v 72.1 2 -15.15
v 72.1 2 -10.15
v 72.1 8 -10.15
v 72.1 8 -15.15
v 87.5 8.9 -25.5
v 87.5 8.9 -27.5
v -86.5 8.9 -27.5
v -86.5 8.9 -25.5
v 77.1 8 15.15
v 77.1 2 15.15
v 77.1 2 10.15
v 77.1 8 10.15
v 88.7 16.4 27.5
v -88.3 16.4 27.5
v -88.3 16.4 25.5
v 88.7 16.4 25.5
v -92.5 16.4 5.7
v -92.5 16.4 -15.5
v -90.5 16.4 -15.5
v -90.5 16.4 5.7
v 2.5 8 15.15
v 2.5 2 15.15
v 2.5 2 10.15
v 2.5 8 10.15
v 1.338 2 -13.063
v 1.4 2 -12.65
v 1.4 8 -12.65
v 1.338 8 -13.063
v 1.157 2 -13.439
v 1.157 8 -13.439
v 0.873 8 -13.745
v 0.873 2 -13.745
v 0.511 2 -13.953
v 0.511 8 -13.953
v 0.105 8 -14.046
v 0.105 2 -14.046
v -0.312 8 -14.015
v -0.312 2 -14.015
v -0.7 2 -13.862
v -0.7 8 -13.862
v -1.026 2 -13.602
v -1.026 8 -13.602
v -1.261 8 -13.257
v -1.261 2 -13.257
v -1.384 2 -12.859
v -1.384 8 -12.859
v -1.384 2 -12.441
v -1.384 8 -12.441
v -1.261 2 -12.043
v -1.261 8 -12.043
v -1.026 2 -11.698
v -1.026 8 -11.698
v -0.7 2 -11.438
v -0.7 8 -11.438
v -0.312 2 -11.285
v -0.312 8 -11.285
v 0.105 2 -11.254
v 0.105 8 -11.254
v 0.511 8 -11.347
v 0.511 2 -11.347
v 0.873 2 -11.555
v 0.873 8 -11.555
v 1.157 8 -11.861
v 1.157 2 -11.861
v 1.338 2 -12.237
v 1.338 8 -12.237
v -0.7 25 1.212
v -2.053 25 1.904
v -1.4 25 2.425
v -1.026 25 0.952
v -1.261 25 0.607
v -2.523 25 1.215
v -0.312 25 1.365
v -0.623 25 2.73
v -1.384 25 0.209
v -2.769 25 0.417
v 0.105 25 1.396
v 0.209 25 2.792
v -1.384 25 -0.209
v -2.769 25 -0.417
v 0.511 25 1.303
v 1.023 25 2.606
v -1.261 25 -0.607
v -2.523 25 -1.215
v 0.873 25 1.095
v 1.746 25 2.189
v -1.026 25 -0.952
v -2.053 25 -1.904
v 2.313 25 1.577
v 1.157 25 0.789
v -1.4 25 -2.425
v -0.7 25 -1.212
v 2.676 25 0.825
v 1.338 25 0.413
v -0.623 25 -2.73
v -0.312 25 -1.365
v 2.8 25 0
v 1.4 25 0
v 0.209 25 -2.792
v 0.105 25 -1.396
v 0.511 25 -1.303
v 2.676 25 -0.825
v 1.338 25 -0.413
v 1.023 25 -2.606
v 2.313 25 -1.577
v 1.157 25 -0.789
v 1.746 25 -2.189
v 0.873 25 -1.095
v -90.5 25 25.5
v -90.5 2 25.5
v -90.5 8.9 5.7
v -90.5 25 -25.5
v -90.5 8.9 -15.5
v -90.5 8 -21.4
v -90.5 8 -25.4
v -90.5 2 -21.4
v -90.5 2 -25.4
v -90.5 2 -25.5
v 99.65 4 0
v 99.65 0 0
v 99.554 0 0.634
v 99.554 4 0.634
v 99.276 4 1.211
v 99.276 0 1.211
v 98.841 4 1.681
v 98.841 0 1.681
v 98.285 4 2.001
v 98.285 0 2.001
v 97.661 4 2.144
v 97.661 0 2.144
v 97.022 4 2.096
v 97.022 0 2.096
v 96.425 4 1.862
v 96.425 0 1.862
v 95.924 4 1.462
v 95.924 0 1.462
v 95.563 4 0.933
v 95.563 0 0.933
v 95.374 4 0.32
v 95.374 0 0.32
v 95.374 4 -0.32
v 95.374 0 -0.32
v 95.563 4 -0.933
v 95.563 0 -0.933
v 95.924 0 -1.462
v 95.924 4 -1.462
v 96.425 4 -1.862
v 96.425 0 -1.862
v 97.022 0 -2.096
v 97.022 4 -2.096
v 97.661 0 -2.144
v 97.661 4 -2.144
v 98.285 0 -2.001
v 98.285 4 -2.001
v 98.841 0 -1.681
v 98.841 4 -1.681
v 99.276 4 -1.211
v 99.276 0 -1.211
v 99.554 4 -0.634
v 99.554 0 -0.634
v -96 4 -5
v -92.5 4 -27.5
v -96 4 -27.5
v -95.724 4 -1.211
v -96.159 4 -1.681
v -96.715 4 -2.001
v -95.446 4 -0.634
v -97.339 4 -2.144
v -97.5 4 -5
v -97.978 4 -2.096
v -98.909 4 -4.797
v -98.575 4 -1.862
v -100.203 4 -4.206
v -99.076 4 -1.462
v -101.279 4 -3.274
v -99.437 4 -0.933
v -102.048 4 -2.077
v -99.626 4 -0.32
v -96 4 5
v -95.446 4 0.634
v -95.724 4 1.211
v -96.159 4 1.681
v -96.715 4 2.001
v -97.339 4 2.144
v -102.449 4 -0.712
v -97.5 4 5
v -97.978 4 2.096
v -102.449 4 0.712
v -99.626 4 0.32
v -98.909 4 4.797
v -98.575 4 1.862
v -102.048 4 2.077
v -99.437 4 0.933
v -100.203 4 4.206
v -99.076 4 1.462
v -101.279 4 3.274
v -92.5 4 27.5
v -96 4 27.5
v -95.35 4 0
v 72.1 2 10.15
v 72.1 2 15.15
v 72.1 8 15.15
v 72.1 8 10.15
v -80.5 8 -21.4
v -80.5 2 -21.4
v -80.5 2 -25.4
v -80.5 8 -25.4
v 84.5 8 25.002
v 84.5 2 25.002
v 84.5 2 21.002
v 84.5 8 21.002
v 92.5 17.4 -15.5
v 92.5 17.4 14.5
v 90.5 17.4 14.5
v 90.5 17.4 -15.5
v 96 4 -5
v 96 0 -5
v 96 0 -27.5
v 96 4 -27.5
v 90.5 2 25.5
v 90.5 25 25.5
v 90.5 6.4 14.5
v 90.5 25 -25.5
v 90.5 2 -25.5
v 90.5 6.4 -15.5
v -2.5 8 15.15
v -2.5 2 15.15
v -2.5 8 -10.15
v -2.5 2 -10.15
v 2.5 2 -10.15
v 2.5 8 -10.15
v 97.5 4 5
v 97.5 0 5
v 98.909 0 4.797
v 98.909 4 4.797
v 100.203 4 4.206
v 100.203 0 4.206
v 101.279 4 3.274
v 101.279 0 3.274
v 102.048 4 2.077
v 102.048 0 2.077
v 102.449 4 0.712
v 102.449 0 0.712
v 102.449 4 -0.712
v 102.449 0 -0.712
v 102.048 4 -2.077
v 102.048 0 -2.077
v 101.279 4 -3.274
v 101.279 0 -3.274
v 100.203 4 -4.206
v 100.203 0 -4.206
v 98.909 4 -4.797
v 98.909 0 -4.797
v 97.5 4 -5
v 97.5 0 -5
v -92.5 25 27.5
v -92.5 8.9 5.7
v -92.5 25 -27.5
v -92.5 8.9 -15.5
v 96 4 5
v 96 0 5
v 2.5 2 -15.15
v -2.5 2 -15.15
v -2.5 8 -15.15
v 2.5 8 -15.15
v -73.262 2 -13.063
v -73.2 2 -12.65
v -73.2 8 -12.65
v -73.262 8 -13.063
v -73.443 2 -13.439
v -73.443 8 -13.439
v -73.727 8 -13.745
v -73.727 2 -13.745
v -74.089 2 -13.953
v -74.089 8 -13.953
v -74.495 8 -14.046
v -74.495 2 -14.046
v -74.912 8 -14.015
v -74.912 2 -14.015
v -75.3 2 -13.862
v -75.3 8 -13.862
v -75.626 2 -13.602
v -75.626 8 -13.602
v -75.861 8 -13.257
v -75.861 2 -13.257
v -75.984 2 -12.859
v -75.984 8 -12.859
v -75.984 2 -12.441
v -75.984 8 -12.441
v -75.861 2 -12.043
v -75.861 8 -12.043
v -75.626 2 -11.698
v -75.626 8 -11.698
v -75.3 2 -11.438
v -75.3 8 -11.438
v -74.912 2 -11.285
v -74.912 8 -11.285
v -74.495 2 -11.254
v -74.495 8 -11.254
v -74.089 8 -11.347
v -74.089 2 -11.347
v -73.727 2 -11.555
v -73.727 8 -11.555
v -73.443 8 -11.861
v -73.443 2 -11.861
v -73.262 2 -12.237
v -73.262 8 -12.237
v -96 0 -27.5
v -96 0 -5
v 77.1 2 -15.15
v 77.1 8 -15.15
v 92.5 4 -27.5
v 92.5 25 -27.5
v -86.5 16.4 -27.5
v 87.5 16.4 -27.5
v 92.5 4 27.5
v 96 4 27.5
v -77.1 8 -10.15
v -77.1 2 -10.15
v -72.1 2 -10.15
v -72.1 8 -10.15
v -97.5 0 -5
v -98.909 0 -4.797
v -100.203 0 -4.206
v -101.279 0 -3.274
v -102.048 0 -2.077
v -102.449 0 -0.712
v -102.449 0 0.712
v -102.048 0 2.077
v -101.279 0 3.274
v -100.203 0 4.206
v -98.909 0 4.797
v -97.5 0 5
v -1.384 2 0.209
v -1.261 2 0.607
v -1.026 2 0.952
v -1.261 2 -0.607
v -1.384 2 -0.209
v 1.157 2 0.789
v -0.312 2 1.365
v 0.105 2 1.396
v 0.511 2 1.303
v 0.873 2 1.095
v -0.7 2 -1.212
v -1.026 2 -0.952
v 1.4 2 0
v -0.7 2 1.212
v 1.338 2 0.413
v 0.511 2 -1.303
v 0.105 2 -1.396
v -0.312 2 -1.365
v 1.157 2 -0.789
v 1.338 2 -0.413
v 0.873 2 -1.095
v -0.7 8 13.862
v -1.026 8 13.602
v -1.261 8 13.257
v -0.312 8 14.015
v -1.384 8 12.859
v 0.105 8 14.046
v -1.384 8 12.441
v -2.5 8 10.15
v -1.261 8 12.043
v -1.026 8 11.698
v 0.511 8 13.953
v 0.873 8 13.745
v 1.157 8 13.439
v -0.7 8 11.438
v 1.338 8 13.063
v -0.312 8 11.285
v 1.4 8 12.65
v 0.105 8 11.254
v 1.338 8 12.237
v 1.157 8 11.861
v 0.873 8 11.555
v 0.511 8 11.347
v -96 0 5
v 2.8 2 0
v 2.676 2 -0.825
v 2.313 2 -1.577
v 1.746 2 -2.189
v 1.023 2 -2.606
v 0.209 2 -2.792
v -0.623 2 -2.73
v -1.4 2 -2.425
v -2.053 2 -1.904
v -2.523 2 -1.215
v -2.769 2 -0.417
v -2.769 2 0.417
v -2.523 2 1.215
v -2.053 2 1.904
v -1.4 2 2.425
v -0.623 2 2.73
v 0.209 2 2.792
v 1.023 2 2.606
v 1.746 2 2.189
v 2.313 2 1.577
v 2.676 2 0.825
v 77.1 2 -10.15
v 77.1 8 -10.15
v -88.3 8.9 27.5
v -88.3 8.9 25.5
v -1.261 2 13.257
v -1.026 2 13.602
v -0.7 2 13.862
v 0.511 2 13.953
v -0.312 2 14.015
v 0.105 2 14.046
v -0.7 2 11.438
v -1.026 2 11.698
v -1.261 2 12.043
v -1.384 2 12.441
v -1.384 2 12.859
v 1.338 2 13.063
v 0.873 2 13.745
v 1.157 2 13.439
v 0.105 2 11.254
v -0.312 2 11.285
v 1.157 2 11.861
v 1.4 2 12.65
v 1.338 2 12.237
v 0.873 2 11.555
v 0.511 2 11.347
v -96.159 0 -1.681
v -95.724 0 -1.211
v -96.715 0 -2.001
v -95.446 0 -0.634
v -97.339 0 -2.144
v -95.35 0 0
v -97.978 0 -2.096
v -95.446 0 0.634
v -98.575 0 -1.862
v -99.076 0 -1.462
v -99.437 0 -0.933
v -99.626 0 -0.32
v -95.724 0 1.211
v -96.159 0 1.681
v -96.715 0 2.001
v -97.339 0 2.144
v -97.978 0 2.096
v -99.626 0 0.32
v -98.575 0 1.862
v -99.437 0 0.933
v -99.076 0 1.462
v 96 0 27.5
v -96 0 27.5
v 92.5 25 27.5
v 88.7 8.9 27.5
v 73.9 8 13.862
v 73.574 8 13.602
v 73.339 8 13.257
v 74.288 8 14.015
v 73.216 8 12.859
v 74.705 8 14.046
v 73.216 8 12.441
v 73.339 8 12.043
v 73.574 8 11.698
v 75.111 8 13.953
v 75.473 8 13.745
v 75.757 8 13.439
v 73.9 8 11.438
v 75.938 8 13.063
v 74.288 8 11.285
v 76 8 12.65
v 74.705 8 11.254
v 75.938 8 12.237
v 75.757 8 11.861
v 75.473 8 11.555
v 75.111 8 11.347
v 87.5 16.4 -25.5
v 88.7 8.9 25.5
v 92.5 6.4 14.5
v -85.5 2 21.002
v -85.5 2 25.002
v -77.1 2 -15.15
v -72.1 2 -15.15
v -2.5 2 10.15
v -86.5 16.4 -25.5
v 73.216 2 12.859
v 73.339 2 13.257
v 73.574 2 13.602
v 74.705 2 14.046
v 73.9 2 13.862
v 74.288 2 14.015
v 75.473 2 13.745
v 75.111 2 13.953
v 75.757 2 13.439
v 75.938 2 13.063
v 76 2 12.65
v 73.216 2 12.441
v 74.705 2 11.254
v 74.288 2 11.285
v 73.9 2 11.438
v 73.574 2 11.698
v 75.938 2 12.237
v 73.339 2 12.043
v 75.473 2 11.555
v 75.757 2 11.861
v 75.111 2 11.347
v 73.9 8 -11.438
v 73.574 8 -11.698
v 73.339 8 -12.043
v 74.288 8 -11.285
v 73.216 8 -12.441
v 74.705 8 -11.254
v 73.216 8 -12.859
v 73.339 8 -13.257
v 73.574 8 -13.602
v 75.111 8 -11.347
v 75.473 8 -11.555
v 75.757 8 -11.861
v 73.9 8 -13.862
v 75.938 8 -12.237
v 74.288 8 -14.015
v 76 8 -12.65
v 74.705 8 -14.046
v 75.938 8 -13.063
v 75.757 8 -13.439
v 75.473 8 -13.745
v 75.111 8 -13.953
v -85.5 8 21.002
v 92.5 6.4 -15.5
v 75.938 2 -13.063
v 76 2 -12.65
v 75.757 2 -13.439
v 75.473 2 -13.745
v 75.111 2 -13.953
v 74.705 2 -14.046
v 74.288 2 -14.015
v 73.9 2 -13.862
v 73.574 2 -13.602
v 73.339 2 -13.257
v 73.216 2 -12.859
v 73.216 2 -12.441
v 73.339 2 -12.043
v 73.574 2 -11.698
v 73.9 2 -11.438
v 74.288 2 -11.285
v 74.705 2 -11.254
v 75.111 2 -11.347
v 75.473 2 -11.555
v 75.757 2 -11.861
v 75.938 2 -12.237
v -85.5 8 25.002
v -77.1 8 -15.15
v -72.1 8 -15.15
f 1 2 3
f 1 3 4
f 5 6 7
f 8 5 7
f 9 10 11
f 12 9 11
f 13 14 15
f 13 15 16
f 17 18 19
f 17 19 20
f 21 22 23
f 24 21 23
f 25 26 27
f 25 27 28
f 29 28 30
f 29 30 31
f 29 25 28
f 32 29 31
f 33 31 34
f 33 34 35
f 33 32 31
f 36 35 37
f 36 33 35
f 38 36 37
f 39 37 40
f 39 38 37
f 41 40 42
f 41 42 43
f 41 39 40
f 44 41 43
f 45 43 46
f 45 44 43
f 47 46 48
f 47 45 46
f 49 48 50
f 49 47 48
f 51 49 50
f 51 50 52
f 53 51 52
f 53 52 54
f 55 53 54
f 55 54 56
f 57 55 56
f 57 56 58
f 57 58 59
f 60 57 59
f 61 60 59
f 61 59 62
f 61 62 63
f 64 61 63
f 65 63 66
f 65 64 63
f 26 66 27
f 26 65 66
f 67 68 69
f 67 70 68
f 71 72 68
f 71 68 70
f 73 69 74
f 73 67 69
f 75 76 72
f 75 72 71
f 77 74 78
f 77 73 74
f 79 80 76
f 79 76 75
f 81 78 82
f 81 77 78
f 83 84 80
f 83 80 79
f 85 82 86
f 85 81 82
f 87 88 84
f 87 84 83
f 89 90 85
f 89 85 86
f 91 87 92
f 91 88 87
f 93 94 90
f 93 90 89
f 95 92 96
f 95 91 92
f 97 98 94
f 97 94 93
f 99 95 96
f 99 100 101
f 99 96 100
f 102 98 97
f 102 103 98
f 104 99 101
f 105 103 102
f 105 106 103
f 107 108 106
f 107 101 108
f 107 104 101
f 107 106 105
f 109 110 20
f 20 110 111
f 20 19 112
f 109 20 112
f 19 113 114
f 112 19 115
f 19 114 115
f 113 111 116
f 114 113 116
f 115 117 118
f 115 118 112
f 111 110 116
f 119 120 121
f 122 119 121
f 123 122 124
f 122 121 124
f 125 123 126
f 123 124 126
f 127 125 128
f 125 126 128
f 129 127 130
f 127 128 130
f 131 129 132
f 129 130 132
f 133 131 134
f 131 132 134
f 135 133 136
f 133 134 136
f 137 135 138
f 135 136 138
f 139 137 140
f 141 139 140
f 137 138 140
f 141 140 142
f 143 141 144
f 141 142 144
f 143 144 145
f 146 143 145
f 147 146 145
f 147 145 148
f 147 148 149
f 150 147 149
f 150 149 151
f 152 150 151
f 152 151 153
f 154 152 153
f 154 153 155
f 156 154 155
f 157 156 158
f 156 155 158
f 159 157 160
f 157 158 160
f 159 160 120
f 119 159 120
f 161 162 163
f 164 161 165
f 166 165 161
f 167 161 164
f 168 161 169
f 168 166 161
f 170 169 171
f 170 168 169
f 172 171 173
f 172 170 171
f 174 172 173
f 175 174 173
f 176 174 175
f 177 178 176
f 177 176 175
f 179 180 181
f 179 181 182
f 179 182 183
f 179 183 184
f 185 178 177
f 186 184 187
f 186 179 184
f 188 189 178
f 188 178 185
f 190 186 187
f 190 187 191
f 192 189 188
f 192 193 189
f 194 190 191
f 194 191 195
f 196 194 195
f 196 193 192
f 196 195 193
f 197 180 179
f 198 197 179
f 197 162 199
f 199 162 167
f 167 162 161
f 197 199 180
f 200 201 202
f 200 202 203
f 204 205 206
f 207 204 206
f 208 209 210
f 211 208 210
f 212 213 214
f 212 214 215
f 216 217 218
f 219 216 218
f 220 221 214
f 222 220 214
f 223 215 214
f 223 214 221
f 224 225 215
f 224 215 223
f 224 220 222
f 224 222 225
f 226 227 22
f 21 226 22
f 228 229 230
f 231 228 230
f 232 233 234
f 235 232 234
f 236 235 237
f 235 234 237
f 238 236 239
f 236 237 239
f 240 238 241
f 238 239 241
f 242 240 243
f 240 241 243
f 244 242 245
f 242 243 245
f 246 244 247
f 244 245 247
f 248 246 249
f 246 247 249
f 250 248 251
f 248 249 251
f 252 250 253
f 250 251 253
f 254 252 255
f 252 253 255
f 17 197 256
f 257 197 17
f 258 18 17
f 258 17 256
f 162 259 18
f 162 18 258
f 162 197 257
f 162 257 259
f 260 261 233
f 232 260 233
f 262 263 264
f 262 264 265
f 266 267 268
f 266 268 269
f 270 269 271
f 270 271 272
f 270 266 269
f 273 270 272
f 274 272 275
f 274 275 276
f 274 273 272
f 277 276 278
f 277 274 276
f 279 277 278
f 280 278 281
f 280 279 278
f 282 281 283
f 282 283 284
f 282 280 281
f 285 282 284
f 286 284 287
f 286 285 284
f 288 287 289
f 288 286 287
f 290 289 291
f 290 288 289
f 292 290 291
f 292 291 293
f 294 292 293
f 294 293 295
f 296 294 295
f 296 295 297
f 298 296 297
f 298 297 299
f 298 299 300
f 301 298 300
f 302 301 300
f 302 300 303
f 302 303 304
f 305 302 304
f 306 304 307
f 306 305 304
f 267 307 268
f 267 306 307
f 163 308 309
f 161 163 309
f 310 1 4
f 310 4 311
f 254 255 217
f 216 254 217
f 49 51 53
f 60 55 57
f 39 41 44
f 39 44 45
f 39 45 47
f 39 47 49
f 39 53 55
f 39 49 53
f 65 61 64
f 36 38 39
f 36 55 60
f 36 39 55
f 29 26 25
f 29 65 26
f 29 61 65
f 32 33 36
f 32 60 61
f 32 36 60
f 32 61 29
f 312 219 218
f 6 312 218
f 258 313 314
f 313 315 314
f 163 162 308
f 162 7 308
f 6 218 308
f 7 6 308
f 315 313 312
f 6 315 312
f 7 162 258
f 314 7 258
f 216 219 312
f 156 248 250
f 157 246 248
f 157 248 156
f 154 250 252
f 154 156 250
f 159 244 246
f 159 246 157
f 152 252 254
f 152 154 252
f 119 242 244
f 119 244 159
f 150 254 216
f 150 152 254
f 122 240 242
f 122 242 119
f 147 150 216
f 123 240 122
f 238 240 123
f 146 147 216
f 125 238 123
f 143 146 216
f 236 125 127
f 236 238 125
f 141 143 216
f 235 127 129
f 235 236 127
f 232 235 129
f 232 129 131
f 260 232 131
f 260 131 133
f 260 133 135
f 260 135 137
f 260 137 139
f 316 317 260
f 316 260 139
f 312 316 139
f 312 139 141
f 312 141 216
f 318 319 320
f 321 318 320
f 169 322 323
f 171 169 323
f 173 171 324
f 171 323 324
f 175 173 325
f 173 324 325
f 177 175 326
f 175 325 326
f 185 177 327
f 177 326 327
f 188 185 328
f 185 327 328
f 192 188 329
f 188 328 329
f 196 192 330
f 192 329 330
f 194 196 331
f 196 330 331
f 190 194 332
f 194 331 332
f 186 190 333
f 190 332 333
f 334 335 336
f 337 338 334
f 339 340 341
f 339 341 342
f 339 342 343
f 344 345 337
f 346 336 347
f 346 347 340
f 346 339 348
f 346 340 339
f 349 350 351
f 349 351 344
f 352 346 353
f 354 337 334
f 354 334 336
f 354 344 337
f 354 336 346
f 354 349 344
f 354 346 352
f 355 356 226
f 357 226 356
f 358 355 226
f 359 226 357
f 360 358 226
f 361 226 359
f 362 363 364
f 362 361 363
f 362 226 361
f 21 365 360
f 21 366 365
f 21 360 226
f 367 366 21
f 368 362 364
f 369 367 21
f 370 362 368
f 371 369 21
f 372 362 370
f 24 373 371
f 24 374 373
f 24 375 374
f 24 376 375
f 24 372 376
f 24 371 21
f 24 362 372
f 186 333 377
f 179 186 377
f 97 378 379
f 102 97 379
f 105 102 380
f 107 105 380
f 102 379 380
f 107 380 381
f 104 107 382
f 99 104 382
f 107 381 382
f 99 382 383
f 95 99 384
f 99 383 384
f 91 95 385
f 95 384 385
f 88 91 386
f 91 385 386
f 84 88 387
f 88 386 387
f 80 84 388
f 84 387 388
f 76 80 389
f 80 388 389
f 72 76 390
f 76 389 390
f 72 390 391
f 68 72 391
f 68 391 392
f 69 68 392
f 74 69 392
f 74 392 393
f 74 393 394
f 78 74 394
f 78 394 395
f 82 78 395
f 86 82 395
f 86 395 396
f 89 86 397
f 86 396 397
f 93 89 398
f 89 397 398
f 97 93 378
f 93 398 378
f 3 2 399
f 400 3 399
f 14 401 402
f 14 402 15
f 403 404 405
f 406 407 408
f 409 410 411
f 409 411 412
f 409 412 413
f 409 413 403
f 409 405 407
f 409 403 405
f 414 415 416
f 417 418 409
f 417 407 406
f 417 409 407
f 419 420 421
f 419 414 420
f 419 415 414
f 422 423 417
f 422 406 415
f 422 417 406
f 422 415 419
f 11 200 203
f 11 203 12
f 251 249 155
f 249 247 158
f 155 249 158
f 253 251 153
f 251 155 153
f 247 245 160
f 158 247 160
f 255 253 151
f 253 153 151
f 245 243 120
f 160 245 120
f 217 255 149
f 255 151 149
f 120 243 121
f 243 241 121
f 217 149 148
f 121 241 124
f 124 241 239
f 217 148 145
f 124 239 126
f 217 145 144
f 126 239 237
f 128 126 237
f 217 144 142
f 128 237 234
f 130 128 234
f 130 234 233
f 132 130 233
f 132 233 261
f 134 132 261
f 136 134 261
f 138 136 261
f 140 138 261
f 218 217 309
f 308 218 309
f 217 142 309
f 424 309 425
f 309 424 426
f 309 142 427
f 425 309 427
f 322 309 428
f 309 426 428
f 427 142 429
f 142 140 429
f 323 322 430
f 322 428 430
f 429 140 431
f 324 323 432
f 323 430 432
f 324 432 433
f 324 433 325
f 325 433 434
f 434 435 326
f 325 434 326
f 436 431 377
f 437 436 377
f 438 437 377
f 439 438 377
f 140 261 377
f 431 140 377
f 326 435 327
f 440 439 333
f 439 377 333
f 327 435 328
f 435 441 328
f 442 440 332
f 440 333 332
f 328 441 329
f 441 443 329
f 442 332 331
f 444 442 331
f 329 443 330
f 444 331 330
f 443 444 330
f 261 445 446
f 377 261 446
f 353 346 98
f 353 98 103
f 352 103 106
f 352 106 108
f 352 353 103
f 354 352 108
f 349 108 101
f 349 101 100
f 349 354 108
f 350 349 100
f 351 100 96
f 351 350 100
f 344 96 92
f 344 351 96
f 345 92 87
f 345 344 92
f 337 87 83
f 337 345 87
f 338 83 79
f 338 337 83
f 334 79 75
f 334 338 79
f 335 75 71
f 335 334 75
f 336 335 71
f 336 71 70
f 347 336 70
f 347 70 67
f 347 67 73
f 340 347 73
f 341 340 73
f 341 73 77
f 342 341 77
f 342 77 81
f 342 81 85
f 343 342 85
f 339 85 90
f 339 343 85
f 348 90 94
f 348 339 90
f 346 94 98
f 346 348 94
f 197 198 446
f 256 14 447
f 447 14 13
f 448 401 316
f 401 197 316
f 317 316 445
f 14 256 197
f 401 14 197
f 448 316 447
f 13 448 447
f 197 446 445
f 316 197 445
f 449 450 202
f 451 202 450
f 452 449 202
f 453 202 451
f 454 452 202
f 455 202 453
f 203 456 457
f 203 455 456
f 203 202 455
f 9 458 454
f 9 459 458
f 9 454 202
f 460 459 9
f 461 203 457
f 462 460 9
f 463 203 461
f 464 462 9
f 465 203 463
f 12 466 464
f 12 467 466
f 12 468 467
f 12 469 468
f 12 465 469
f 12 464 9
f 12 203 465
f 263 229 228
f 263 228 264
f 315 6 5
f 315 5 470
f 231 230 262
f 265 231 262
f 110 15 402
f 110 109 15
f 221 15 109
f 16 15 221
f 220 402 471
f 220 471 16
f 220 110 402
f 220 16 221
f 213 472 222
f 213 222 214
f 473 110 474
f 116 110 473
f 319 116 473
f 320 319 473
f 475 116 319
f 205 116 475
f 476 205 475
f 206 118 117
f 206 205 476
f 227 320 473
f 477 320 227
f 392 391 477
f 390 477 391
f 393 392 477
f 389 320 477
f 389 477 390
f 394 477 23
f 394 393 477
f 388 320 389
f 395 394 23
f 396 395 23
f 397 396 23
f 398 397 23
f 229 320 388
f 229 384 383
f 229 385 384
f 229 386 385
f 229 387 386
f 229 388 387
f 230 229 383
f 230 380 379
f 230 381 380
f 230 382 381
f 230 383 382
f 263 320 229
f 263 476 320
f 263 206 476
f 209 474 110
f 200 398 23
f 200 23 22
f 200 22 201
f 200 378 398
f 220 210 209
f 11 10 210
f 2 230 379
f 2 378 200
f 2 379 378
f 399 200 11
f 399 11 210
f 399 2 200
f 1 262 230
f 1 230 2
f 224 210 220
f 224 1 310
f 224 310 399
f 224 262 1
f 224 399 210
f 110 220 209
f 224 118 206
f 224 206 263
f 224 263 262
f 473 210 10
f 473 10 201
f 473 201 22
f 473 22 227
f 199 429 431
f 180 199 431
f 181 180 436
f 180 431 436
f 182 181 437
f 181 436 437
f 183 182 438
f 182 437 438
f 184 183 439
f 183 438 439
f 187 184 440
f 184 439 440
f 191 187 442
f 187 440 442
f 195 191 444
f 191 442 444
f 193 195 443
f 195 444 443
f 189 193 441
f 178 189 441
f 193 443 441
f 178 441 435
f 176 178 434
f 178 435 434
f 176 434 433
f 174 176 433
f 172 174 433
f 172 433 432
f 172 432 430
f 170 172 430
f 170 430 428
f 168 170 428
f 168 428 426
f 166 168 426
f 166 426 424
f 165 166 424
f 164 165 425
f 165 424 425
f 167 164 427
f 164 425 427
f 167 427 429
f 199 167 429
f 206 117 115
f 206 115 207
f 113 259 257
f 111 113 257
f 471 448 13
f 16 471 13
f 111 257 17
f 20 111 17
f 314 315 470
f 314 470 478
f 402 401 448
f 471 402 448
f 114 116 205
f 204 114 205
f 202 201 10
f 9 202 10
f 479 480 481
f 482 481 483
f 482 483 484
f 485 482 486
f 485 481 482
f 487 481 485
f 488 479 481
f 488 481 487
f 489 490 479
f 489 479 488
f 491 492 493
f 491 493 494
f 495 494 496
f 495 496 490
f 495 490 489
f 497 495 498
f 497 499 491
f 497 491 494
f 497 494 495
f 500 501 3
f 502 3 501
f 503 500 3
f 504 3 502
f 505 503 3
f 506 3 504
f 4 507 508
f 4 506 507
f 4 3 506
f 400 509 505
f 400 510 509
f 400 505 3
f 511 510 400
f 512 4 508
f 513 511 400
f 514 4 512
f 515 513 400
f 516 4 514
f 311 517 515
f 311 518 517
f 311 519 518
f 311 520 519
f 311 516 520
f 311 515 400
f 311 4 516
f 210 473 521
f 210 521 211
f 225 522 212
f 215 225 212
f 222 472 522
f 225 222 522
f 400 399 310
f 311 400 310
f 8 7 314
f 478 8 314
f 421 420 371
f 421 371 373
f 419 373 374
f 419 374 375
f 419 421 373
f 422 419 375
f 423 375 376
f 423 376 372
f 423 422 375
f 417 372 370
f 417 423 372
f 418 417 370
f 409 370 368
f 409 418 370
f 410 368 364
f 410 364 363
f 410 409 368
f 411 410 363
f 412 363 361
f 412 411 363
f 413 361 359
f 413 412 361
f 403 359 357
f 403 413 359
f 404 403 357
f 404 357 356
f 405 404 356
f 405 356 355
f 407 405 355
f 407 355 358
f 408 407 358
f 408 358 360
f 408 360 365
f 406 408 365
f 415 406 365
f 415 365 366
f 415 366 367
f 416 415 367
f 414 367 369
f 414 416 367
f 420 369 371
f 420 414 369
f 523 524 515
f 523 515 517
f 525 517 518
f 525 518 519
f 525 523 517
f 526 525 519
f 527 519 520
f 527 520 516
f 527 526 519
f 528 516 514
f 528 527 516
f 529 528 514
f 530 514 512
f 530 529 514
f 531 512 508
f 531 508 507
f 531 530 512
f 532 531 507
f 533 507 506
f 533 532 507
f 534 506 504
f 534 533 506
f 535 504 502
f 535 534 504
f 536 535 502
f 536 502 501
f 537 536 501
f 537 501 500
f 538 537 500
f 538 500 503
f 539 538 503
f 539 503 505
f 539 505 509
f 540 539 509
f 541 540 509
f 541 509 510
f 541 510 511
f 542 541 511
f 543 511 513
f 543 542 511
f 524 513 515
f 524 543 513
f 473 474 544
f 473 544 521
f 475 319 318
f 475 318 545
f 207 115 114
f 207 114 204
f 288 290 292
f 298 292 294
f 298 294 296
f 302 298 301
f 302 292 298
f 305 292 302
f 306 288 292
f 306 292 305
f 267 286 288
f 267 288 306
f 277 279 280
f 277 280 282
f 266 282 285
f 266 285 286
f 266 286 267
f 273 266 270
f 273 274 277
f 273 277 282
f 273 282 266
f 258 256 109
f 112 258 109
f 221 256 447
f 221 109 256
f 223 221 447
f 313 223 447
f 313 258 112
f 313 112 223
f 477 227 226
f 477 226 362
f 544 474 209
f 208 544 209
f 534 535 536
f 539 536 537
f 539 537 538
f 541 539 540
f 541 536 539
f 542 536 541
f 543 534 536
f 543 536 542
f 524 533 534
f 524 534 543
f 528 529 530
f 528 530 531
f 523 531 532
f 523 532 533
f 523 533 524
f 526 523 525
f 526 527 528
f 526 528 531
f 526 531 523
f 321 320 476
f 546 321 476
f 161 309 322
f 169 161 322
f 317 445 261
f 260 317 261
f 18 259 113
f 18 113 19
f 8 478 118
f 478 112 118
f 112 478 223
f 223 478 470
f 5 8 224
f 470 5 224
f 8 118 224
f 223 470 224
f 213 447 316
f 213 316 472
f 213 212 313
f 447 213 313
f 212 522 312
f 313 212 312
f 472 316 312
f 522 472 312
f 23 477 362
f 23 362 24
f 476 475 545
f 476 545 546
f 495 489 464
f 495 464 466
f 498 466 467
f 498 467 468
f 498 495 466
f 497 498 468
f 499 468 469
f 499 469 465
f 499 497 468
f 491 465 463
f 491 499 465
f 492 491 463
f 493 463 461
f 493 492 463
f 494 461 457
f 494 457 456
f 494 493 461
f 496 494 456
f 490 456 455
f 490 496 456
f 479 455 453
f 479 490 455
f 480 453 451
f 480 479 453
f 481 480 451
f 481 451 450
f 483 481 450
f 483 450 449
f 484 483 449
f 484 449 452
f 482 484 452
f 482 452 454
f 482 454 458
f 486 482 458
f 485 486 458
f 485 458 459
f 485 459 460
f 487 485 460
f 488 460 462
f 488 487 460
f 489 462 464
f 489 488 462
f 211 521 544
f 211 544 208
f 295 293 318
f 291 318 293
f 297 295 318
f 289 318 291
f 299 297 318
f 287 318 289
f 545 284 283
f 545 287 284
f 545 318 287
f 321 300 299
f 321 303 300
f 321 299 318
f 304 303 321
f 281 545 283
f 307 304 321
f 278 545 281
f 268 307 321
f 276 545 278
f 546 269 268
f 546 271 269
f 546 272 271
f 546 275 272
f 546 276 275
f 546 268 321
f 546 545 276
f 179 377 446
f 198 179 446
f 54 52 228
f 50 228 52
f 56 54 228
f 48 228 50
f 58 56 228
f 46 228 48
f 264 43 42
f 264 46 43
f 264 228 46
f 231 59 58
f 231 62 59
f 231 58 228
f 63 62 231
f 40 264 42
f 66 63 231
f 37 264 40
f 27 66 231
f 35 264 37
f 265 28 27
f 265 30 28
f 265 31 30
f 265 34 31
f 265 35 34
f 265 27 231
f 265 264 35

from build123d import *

# Parameters (mm, degrees)
SKETCH_1_W           = 185
SKETCH_1_H           = 55
EXTRUDE_1_DEPTH      = 25
SHELL_1_T            = -2
SKETCH_8_R           = 2.15
EXTRUDE_3_DEPTH      = 4
SKETCH_2_W           = 10
SKETCH_2_H           = 4
SKETCH_2_W_2         = 5
SKETCH_2_H_2         = 5
SKETCH_2_R           = 1.4
SKETCH_2_W_3         = 170
EXTRUDE_4_DEPTH      = 6
SKETCH_2_6_R         = 2.8
SKETCH_2_6_R_2       = 1.4
EXTRUDE_6_DEPTH      = 23
SKETCH_9_W           = 30
SKETCH_9_H           = 11
CUT_EXTRUDE_7_DEPTH  = 5
SKETCH_10_W          = 177
SKETCH_10_H          = 7.5
CUT_EXTRUDE_8_DEPTH  = 5
SKETCH_11_W          = 21.2
SKETCH_11_H          = 7.5
CUT_EXTRUDE_9_DEPTH  = 5
SKETCH_12_W          = 174
SKETCH_12_H          = 7.5
CUT_EXTRUDE_10_DEPTH = 5


with BuildPart() as part:
    # 草图1 → 凸台-拉伸1 (new body)
    with BuildSketch(Plane(origin=(0, 0, 0), x_dir=(1, 0, 0), z_dir=(0, 1, 0))):
        Rectangle(SKETCH_1_W, SKETCH_1_H)
    extrude(amount=EXTRUDE_1_DEPTH)

    # 抽壳1
    shell_1_openings = [part.faces().sort_by_distance(p)[0] for p in [
        (0, 25, 0),
    ]]
    offset(amount=SHELL_1_T, openings=shell_1_openings, kind=Kind.INTERSECTION)

    # 草图8 → 凸台-拉伸3 (add)
    # profile 1 of 2: a face of its own
    with BuildSketch(Plane.XZ):
        with BuildLine():
            Line((-97.5, 5), (-96, 5))
            Line((-96, 5), (-96, 27.5))
            Line((-96, 27.5), (-92.5, 27.5))
            Line((-92.5, 27.5), (-92.5, -27.5))
            Line((-92.5, -27.5), (-96, -27.5))
            Line((-96, -27.5), (-96, -5))
            Line((-96, -5), (-97.5, -5))
            ThreePointArc((-97.5, -5), (-102.5, 0), (-97.5, 5))
        make_face()
        with Locations((-97.5, 0)):
            Circle(SKETCH_8_R, mode=Mode.SUBTRACT)
    # profile 2 of 2: a face of its own
    with BuildSketch(Plane.XZ):
        with BuildLine():
            Line((97.5, -5), (96, -5))
            Line((96, -5), (96, -27.5))
            Line((96, -27.5), (92.5, -27.5))
            Line((92.5, -27.5), (92.5, -5))
            Line((92.5, -5), (92.5, 5))
            Line((92.5, 5), (92.5, 27.5))
            Line((92.5, 27.5), (96, 27.5))
            Line((96, 27.5), (96, 5))
            Line((96, 5), (97.5, 5))
            ThreePointArc((97.5, 5), (102.5, 0), (97.5, -5))
        make_face()
        with Locations((97.5, 0)):
            Circle(SKETCH_8_R, mode=Mode.SUBTRACT)
    extrude(amount=-EXTRUDE_3_DEPTH)

    # 草图2 → 凸台-拉伸4 (add)
    # profile 1 of 7: a face of its own
    with BuildSketch(Plane(origin=(0, 2, 0), x_dir=(1, 0, 0), z_dir=(0, 1, 0))):
        with Locations((-85.5, 23.4)):
            Rectangle(SKETCH_2_W, SKETCH_2_H)
    # profile 2 of 7: a face of its own
    with BuildSketch(Plane(origin=(0, 2, 0), x_dir=(1, 0, 0), z_dir=(0, 1, 0))):
        with Locations((-74.6, 12.65)):
            Rectangle(SKETCH_2_W_2, SKETCH_2_H_2)
        with Locations((-74.6, 12.65)):
            Circle(SKETCH_2_R, mode=Mode.SUBTRACT)
    # profile 3 of 7: a face of its own
    with BuildSketch(Plane(origin=(0, 2, 0), x_dir=(1, 0, 0), z_dir=(0, 1, 0))):
        with Locations((74.6, -12.65)):
            Rectangle(SKETCH_2_W_2, SKETCH_2_H_2)
        with Locations((74.6, -12.65)):
            Circle(SKETCH_2_R, mode=Mode.SUBTRACT)
    # profile 4 of 7: a face of its own
    with BuildSketch(Plane(origin=(0, 2, 0), x_dir=(1, 0, 0), z_dir=(0, 1, 0))):
        with Locations((74.6, 12.65)):
            Rectangle(SKETCH_2_W_2, SKETCH_2_H_2)
        with Locations((74.6, 12.65)):
            Circle(SKETCH_2_R, mode=Mode.SUBTRACT)
    # profile 5 of 7: a face of its own
    with BuildSketch(Plane(origin=(0, 2, 0), x_dir=(1, 0, 0), z_dir=(0, 1, 0))):
        with Locations((0, -12.65)):
            Rectangle(SKETCH_2_W_2, SKETCH_2_H_2)
        with Locations((0, -12.65)):
            Circle(SKETCH_2_R, mode=Mode.SUBTRACT)
    # profile 6 of 7: a face of its own
    with BuildSketch(Plane(origin=(0, 2, 0), x_dir=(1, 0, 0), z_dir=(0, 1, 0))):
        with Locations((0, 12.65)):
            Rectangle(SKETCH_2_W_2, SKETCH_2_H_2)
        with Locations((0, 12.65)):
            Circle(SKETCH_2_R, mode=Mode.SUBTRACT)
    # profile 7 of 7: a face of its own
    with BuildSketch(Plane(origin=(0, 2, 0), x_dir=(1, 0, 0), z_dir=(0, 1, 0))):
        with Locations((-0.5, -23.002466961)):
            Rectangle(SKETCH_2_W_3, SKETCH_2_H)
    extrude(amount=EXTRUDE_4_DEPTH)

    # 草图2<6> → 凸台-拉伸6 (add)
    with BuildSketch(Plane(origin=(0, 2, 0), x_dir=(1, 0, 0), z_dir=(0, 1, 0))):
        Circle(SKETCH_2_6_R)
        Circle(SKETCH_2_6_R_2, mode=Mode.SUBTRACT)
    extrude(amount=EXTRUDE_6_DEPTH)

    # 草图9 → 切除-拉伸7 (cut)
    with BuildSketch(Plane(origin=(92.5, 0, 0), x_dir=(0, 0, -1), z_dir=(1, 0, 0))):
        with Locations((0.5, 11.9)):
            Rectangle(SKETCH_9_W, SKETCH_9_H)
    extrude(amount=-CUT_EXTRUDE_7_DEPTH, mode=Mode.SUBTRACT)

    # 草图10 → 切除-拉伸8 (cut)
    with BuildSketch(Plane.XY.offset(27.5)):
        with Locations((0.2, 12.65)):
            Rectangle(SKETCH_10_W, SKETCH_10_H)
    extrude(amount=-CUT_EXTRUDE_8_DEPTH, mode=Mode.SUBTRACT)

    # 草图11 → 切除-拉伸9 (cut)
    with BuildSketch(Plane.ZY.offset(92.5)):
        with Locations((-4.9, 12.65)):
            Rectangle(SKETCH_11_W, SKETCH_11_H)
    extrude(amount=-CUT_EXTRUDE_9_DEPTH, mode=Mode.SUBTRACT)

    # 草图12 → 切除-拉伸10 (cut)
    with BuildSketch(Plane(origin=(0, 0, -27.5), x_dir=(-1, 0, 0), z_dir=(0, 0, -1))):
        with Locations((-0.5, 12.65)):
            Rectangle(SKETCH_12_W, SKETCH_12_H)
    extrude(amount=-CUT_EXTRUDE_10_DEPTH, mode=Mode.SUBTRACT)


solid = part.part
